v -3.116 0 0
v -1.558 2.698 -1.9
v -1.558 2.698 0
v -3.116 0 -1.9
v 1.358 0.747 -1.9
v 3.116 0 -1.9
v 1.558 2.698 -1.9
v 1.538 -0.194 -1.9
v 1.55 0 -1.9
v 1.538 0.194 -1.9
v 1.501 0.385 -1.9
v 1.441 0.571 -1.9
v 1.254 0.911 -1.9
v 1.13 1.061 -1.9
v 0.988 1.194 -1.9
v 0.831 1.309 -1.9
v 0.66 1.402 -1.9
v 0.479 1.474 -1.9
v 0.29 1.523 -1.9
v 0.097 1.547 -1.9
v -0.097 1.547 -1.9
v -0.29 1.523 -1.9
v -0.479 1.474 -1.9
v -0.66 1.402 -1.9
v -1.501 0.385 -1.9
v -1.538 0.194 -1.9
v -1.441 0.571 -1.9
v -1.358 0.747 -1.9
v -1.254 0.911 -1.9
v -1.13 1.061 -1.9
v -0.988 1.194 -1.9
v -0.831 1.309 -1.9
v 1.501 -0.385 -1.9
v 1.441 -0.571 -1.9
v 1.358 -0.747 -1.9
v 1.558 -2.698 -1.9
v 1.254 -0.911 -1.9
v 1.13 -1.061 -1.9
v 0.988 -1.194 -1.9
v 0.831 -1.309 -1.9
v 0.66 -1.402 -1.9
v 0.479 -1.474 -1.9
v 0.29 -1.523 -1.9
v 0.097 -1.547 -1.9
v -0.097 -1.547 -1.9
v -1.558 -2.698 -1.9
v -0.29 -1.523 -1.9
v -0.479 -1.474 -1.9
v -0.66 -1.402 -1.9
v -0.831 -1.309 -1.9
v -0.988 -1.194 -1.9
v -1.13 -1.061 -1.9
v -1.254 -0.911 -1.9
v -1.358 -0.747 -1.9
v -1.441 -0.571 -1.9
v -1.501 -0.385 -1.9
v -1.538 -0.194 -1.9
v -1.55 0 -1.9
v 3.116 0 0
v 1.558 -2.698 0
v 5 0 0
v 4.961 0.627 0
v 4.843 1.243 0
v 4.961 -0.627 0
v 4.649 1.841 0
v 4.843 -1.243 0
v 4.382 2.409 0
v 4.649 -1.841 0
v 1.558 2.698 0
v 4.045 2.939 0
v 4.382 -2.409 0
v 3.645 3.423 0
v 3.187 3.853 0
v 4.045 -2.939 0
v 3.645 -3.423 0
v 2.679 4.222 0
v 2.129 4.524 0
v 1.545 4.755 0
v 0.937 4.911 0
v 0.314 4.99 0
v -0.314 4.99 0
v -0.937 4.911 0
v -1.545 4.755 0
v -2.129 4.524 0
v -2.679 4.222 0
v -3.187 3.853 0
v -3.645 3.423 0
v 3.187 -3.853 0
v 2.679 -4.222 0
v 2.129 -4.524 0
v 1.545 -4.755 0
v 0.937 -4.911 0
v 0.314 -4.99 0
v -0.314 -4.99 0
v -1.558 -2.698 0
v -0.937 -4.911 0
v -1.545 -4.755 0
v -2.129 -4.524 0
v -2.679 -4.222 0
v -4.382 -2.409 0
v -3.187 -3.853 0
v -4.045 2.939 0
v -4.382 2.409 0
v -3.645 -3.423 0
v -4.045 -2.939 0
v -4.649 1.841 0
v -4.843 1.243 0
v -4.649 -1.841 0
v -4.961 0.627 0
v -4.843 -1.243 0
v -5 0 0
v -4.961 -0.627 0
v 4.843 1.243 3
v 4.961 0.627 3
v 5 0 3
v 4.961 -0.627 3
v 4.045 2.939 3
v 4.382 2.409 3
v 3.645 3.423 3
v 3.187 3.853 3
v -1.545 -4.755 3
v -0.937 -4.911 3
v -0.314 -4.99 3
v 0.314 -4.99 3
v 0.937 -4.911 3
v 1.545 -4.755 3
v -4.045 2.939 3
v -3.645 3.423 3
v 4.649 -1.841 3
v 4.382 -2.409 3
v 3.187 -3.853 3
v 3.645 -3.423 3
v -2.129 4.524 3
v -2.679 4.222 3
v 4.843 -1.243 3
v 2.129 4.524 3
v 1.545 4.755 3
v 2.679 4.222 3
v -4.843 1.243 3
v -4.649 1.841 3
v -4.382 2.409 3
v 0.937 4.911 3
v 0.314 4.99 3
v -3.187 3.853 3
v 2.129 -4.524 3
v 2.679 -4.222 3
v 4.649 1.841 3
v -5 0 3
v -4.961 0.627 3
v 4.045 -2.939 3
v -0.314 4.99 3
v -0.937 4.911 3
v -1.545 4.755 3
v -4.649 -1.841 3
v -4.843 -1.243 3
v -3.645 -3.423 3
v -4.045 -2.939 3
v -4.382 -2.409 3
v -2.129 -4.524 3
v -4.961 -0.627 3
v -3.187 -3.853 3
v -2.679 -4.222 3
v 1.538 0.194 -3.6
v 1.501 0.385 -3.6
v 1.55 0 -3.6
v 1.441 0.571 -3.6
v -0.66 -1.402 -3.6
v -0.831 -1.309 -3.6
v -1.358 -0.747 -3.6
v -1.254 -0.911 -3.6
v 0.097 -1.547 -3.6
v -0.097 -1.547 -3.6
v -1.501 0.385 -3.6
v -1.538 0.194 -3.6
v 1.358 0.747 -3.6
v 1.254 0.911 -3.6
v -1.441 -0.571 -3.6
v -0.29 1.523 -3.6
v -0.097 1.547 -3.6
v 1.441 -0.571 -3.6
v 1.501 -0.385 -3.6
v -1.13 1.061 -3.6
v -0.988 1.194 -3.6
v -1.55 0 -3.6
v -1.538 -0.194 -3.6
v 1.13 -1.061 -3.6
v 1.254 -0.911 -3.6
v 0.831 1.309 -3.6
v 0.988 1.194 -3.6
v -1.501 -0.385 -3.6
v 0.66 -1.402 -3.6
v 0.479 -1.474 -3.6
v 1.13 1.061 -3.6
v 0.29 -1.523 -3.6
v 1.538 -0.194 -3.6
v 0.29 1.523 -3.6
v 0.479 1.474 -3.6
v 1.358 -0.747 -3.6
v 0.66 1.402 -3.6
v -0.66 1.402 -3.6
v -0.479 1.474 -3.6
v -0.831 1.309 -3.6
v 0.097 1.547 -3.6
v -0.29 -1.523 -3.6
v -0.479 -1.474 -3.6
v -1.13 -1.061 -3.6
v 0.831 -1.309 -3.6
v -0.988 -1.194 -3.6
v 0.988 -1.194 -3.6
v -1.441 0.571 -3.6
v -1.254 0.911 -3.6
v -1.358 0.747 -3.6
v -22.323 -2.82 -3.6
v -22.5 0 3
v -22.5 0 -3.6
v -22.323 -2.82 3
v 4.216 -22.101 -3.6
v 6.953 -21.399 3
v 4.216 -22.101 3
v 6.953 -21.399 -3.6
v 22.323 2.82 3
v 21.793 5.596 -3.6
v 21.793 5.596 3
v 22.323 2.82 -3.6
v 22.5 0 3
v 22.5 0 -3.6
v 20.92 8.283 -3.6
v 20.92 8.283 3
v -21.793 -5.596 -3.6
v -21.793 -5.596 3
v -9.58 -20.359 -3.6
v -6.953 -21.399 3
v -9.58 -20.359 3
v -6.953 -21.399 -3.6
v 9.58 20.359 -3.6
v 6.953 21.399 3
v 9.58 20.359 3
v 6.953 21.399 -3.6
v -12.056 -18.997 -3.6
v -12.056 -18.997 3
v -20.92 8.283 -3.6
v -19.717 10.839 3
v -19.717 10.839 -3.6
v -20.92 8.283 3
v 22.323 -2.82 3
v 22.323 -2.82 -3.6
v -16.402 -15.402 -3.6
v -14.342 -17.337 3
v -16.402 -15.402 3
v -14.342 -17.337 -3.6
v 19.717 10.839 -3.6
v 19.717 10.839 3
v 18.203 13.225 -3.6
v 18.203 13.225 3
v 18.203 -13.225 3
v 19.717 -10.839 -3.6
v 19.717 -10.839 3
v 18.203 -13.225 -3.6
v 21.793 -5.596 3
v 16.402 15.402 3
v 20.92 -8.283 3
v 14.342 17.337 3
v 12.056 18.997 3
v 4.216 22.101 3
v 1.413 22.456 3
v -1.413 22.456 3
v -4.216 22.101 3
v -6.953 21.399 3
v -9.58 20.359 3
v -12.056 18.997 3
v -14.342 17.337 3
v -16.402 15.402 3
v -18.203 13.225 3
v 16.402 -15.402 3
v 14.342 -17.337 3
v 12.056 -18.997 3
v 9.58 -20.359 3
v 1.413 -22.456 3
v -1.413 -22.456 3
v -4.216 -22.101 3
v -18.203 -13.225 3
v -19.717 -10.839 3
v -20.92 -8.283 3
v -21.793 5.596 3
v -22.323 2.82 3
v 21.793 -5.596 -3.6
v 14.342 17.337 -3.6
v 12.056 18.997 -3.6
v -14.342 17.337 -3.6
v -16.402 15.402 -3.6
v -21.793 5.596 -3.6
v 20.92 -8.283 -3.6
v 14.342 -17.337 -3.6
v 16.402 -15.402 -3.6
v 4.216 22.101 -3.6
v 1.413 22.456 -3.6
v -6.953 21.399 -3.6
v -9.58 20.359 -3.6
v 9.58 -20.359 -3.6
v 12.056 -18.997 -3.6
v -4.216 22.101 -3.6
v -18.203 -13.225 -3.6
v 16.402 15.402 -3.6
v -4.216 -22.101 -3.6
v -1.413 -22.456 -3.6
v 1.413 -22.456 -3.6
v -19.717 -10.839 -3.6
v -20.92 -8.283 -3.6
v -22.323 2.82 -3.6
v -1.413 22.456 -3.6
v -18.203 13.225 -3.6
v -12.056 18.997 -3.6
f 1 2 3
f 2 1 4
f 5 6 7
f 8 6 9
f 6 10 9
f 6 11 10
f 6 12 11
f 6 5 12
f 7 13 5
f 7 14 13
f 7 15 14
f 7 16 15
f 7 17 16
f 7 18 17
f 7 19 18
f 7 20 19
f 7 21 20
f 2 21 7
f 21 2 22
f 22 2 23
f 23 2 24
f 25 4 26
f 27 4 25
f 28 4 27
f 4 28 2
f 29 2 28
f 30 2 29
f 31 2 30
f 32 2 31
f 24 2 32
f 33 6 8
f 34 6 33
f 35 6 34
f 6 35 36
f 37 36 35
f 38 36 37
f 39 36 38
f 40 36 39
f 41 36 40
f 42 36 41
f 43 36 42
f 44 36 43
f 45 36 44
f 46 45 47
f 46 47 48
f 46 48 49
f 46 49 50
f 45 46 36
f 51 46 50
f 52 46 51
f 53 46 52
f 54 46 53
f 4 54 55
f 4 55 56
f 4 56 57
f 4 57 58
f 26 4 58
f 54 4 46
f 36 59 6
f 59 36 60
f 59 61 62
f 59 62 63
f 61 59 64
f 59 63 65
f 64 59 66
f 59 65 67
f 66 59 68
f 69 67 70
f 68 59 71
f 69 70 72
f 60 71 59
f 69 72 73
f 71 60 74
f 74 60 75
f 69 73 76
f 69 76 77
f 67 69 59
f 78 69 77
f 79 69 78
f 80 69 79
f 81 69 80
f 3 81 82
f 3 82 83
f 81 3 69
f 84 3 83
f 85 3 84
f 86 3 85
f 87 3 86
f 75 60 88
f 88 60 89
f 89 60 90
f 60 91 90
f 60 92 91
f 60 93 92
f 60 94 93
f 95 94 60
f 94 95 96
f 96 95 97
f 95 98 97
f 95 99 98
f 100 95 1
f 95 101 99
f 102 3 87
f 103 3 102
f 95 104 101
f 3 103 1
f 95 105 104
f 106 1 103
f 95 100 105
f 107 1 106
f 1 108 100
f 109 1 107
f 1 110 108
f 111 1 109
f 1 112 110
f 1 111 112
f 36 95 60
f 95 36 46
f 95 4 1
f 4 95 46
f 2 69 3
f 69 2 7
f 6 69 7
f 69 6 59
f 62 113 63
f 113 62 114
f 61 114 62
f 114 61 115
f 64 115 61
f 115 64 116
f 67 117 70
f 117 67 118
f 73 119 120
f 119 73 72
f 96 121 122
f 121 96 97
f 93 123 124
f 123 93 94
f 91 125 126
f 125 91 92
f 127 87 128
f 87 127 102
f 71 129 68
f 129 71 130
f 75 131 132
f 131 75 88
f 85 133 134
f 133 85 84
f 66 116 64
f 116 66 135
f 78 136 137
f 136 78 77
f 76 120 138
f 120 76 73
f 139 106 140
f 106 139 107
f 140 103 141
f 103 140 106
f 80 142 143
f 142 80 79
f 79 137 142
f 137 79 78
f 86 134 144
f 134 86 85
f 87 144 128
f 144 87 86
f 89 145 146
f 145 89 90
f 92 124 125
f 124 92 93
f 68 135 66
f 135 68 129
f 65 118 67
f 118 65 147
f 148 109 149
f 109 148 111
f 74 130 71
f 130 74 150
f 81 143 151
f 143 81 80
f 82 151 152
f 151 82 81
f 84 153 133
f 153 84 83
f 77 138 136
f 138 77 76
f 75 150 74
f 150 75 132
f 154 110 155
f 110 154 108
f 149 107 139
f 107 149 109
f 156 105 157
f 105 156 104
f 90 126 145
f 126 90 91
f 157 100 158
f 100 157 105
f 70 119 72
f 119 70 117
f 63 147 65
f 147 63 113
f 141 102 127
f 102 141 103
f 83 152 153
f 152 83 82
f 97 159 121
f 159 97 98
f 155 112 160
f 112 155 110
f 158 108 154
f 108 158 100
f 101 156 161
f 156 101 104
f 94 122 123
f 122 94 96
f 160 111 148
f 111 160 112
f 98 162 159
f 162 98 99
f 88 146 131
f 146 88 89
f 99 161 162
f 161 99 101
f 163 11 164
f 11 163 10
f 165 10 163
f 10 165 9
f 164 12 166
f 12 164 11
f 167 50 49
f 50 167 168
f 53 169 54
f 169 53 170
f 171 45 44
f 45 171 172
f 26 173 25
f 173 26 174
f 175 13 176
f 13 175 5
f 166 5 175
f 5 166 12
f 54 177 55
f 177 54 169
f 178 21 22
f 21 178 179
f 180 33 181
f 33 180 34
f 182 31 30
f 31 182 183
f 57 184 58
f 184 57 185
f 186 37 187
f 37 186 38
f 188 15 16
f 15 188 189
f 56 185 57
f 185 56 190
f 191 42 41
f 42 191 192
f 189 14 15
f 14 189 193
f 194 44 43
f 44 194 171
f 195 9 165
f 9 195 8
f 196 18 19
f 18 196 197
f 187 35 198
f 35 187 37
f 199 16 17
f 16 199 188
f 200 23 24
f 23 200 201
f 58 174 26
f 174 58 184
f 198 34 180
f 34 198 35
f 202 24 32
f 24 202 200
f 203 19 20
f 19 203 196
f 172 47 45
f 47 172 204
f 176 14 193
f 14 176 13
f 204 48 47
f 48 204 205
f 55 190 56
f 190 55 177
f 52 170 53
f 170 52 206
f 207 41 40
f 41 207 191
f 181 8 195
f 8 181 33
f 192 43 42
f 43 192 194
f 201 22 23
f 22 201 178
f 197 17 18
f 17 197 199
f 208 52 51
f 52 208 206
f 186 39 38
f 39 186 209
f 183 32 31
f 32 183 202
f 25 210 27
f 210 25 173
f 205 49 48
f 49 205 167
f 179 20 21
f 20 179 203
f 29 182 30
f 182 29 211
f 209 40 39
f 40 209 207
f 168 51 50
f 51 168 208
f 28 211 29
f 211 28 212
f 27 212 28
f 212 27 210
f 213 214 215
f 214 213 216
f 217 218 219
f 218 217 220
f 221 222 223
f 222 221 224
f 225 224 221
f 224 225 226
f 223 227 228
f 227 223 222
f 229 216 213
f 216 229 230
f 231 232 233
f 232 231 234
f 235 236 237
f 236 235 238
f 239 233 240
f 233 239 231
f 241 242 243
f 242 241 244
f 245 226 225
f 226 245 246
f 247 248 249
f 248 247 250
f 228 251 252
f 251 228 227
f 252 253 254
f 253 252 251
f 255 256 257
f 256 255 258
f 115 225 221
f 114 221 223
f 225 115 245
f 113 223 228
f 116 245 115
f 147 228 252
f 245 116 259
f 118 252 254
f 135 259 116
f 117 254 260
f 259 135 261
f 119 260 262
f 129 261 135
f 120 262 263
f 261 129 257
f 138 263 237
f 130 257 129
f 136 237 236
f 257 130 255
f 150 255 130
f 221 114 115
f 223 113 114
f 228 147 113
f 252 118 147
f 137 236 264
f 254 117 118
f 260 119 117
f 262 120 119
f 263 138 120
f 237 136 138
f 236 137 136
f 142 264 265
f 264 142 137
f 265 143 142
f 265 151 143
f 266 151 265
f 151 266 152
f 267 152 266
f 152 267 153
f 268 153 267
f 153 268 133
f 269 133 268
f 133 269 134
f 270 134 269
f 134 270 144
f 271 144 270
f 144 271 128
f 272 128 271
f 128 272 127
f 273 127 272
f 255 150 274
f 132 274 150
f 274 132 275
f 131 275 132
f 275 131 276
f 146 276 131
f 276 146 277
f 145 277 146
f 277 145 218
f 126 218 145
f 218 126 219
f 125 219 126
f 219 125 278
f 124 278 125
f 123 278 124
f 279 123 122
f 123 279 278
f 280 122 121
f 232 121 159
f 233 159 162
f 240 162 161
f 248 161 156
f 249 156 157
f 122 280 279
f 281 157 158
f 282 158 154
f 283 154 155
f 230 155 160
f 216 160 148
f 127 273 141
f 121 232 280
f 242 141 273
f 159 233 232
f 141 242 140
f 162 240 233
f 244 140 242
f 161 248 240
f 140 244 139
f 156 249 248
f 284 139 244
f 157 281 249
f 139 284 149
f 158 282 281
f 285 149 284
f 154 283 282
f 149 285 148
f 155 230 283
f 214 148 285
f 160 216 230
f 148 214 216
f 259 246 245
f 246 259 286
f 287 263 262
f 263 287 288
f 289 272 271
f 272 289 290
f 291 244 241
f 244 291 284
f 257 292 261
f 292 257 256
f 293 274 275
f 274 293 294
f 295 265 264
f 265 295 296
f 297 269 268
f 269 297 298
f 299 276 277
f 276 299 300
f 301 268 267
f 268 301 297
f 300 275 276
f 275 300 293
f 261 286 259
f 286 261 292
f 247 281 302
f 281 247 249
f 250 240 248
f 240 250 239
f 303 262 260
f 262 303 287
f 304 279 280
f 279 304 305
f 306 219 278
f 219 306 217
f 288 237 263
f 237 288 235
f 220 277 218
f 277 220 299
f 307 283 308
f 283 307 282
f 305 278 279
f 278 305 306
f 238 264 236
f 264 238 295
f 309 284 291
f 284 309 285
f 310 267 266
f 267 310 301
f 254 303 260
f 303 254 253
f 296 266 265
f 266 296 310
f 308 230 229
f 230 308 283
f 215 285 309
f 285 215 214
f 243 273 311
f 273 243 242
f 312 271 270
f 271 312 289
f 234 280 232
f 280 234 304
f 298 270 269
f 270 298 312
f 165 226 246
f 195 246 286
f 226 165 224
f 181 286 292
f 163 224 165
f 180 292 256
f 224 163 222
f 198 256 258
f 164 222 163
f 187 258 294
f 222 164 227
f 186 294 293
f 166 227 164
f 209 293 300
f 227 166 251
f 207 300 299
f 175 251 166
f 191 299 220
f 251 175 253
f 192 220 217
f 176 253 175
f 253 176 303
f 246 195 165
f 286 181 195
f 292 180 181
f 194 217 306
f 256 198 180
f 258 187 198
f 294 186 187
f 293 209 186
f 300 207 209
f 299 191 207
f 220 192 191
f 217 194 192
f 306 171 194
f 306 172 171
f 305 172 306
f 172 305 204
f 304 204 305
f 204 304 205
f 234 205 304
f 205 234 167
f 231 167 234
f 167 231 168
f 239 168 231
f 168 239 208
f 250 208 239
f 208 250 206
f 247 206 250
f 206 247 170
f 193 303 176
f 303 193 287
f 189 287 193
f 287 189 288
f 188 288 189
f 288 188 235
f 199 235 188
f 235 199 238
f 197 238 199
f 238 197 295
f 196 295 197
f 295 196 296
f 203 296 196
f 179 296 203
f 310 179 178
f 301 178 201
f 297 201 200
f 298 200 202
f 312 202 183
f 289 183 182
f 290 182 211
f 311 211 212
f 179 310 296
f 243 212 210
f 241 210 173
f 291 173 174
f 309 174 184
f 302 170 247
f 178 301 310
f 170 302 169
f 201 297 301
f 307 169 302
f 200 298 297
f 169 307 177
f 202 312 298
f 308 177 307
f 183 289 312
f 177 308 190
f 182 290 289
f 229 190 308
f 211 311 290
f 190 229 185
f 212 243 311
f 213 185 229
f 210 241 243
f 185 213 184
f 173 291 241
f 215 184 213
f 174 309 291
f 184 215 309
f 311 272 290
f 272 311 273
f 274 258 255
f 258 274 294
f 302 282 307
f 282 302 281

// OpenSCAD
$fn = 50;


difference() {
	union() {
		translate(v = [0, 0, -3.6000000000]) {
			cylinder(h = 6.6000000000, r = 22.5000000000);
		}
	}
	union() {
		translate(v = [0, 0, 0]) {
			rotate(a = [0, 0, 0]) {
				difference() {
					union() {
						translate(v = [0, 0, -1.9000000000]) {
							linear_extrude(height = 1.9000000000) {
								polygon(points = [[3.1158000000, 0.0000000000], [1.5579000000, 2.6983619531], [-1.5579000000, 2.6983619531], [-3.1158000000, 0.0000000000], [-1.5579000000, -2.6983619531], [1.5579000000, -2.6983619531]]);
							}
						}
					}
					union();
				}
			}
		}
		#cylinder(h = 3, r = 5.0000000000);
		#translate(v = [0, 0, -100.0000000000]) {
			cylinder(h = 200, r = 1.5500000000);
		}
	}
}
